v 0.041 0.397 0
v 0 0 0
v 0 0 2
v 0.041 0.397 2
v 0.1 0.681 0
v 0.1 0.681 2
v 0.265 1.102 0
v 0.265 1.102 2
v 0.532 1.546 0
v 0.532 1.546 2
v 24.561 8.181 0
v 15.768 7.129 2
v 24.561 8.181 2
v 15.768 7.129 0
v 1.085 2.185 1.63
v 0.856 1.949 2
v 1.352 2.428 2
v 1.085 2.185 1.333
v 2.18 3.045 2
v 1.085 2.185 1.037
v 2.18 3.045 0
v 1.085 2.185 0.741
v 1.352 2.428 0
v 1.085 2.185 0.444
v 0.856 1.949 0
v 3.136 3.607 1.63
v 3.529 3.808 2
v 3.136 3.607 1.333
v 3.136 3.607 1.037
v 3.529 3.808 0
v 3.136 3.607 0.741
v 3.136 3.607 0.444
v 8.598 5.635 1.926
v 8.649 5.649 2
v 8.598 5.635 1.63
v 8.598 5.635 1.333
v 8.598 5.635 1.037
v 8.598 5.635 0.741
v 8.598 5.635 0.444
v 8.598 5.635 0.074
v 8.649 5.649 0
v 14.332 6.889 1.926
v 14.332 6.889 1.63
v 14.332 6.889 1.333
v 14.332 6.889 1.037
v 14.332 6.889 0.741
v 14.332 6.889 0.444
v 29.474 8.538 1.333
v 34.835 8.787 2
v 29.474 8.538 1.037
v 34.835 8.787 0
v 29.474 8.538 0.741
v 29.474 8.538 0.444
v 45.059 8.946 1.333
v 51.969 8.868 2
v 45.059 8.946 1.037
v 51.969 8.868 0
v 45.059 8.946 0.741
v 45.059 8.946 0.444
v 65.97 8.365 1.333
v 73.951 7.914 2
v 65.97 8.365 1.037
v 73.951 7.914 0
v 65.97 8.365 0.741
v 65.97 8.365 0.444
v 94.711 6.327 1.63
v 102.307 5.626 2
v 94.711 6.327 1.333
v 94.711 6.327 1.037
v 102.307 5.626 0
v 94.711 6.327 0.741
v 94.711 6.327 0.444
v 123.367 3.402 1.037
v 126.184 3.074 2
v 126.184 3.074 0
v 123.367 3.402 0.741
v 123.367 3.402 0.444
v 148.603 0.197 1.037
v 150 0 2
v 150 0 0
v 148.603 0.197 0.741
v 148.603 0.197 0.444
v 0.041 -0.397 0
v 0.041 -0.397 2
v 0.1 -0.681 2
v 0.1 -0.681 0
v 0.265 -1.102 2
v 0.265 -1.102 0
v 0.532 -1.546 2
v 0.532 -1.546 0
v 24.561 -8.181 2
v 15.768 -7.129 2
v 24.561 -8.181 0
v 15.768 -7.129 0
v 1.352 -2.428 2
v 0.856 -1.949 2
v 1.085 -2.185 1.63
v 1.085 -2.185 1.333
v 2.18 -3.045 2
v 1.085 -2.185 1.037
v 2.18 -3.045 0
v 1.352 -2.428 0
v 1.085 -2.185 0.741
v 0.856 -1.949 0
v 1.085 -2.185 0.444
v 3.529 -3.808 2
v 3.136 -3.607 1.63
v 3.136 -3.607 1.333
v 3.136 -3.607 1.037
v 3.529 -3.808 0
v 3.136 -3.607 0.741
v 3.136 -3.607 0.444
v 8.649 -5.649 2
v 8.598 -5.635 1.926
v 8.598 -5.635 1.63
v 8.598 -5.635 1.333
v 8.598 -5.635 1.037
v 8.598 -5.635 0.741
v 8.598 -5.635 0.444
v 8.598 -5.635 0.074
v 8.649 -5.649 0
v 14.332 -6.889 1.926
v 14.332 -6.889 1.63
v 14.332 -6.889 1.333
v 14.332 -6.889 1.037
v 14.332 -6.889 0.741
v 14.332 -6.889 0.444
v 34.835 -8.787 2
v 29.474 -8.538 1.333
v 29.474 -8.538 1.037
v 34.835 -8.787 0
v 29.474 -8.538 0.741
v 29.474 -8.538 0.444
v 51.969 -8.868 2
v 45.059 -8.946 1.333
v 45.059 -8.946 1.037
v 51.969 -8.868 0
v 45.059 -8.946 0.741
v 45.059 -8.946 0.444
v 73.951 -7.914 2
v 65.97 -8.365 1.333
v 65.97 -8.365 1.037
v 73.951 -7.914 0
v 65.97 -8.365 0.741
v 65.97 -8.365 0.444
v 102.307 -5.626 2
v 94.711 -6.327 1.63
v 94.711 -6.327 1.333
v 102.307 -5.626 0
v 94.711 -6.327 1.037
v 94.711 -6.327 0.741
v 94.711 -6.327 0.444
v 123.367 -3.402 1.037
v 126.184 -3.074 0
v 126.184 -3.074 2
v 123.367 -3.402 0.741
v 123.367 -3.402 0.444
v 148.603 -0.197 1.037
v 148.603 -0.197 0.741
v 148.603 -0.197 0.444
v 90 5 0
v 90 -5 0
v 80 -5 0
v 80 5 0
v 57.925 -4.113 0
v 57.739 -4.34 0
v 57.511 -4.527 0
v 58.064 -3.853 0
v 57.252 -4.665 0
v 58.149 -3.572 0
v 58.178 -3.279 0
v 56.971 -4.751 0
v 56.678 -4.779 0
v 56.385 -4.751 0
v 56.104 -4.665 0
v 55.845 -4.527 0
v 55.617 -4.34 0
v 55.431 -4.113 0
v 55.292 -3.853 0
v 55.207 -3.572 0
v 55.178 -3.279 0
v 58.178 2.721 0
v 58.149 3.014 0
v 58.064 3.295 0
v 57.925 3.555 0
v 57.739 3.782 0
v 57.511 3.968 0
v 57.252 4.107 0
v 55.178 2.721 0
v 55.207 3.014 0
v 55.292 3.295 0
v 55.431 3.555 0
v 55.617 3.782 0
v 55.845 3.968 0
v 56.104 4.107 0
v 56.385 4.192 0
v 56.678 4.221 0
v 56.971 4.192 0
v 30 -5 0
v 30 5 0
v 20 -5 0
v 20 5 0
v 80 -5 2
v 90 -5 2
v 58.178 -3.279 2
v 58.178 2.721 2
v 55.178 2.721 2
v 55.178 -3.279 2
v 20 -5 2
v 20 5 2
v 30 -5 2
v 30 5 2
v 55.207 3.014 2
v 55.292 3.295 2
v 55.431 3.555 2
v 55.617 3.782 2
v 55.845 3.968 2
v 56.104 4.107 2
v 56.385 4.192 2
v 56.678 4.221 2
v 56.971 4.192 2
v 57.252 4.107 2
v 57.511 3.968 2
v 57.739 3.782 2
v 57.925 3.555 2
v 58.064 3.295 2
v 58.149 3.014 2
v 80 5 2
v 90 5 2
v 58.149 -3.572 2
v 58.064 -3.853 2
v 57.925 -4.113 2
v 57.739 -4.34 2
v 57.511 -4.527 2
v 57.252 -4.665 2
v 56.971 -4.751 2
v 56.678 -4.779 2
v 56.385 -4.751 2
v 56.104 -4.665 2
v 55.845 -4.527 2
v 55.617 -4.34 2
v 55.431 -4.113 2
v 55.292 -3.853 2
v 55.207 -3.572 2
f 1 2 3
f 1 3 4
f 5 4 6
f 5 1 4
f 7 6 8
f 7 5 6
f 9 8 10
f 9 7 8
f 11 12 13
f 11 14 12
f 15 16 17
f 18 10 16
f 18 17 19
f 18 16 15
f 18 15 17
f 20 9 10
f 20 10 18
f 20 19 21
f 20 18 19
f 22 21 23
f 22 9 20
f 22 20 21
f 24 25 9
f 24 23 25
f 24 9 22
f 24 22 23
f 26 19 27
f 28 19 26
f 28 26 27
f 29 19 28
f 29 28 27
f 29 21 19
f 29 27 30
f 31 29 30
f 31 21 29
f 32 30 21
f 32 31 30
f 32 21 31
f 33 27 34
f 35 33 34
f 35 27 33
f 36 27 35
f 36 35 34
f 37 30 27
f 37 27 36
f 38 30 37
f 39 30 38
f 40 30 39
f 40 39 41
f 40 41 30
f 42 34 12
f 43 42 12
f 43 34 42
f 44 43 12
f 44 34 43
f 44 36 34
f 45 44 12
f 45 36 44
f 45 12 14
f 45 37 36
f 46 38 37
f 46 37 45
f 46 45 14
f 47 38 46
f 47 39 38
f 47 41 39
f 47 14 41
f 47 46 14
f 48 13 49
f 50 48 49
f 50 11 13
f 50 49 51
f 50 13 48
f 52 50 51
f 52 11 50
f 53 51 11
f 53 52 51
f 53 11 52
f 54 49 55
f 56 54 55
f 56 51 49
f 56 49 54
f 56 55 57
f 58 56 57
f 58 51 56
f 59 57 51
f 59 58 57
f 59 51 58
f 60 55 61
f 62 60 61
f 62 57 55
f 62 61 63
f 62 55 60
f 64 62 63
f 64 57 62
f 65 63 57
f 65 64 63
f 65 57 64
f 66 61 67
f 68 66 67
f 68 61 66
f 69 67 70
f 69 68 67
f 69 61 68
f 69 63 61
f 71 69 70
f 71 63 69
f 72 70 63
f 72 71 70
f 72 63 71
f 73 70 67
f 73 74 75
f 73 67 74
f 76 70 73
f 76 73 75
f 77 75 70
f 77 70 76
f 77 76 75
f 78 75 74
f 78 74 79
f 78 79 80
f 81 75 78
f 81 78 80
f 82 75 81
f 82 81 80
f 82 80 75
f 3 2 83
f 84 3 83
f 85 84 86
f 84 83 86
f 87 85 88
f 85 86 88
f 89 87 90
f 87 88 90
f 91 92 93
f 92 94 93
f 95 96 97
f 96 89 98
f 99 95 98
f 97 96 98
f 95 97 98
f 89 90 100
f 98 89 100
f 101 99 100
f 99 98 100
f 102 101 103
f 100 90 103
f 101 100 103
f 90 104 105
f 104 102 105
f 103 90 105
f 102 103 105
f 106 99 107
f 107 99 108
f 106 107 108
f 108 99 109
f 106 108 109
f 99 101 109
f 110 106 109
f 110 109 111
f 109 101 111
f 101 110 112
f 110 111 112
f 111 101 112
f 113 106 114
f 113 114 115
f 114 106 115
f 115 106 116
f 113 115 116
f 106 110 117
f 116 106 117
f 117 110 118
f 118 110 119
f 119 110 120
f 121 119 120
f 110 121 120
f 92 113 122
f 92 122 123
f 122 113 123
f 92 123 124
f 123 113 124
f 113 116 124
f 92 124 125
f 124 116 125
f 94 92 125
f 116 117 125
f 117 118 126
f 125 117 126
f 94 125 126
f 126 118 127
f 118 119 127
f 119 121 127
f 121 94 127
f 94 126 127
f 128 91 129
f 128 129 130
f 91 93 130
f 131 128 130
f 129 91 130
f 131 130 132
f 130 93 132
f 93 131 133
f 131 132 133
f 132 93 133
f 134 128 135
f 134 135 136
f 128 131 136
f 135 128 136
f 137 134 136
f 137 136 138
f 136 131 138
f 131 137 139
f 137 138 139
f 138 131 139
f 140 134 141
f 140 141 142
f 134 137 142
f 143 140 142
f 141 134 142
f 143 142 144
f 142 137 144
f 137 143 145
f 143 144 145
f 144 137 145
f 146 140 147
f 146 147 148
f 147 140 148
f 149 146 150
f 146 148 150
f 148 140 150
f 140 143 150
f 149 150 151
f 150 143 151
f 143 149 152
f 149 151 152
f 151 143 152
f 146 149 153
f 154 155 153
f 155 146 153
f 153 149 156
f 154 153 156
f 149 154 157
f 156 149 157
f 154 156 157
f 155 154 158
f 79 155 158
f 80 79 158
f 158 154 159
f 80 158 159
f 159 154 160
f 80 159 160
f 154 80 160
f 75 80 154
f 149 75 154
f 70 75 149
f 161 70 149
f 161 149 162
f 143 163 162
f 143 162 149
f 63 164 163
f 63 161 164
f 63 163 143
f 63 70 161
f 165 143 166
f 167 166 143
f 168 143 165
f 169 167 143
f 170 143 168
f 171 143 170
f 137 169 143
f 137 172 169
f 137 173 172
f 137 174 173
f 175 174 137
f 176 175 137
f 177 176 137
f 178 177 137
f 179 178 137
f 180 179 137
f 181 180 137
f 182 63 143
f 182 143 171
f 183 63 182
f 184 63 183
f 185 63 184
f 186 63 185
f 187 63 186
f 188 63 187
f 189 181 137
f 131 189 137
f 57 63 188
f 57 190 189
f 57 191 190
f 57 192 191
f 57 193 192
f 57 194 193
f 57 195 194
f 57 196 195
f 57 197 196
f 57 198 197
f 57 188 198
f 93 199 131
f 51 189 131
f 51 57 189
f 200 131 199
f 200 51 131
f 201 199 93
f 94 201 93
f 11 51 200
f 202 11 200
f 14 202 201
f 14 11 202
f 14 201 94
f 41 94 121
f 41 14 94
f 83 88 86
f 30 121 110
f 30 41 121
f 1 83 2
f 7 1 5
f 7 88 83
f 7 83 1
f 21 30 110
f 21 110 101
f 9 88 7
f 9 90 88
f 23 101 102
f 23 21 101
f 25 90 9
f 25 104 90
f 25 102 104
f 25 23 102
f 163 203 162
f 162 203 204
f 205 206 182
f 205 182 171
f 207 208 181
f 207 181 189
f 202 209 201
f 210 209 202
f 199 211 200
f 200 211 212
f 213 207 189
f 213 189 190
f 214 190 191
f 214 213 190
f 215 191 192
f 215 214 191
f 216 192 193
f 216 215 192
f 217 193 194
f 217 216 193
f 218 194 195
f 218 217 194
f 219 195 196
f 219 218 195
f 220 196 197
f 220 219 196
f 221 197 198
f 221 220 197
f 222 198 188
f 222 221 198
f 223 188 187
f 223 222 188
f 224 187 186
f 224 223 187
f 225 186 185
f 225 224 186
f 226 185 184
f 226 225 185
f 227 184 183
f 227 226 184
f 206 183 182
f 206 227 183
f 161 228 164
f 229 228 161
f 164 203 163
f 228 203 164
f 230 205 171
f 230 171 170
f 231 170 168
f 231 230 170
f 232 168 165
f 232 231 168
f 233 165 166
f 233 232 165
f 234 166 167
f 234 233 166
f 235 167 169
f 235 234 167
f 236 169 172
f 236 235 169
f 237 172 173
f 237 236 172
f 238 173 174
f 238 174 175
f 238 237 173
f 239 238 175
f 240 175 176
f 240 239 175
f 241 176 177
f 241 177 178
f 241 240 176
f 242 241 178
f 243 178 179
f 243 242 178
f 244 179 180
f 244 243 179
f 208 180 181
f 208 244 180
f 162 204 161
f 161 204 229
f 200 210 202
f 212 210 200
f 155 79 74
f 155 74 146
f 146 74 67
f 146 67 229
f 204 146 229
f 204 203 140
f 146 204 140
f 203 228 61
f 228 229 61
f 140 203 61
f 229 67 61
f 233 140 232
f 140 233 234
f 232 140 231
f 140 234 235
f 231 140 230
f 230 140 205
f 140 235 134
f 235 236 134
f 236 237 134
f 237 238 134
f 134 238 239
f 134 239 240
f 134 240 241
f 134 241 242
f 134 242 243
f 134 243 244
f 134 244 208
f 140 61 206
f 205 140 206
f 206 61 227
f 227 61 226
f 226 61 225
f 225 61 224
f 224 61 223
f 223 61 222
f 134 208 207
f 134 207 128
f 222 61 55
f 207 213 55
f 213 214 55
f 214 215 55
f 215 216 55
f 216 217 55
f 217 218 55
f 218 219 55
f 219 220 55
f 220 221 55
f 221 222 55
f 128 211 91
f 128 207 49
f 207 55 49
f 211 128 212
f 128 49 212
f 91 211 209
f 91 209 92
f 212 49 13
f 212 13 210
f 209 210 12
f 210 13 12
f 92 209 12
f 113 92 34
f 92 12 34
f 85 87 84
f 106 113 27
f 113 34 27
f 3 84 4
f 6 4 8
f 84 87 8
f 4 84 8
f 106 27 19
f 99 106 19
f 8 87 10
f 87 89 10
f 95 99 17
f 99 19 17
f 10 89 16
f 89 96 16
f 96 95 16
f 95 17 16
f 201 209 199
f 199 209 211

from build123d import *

# Parameters (mm, degrees)
BOSS_EXTRUDE1_DEPTH = 2
SKETCH2_W           = 10
SKETCH2_H           = 10
CUT_EXTRUDE1_DEPTH  = 2
CUT_EXTRUDE2_DEPTH  = 2


with BuildPart() as part:
    # Sketch1 → Boss-Extrude1 (new body)
    with BuildSketch(Plane.XY):
        with BuildLine():
            add(Edge.make_bspline(
                [(0, 0), (0.017737679, 0.21563179), (0.054124727, 0.657978531), (0.343214492, 1.298862569), (0.793518335, 1.915453085), (1.418593739, 2.510411621), (2.210440726, 3.08584076), (3.169840337, 3.64229027), (4.294762462, 4.179129104), (5.583413569, 4.69513941), (7.033172592, 5.188783743), (8.640964446, 5.658406049), (11.080866503, 6.272892351), (14.502446863, 6.955454069), (19.033265173, 7.627780104), (24.084738243, 8.169485105), (29.61030038, 8.573350569), (36.653446176, 8.884204814), (45.268552866, 8.994485881), (55.449246929, 8.823980559), (67.247179838, 8.346573268), (80.384127491, 7.524875895), (94.475089666, 6.381384792), (108.784193237, 5.015612692), (123.127907022, 3.461297117), (136.57914049, 1.828195781), (145.420848795, 0.64480177), (149.505193273, 0.070051229), (149.970810304, 0.00413247), (150, 0)],
                knots=[0, 0, 0, 0, 0.004217542, 0.008651859, 0.013562306, 0.019137014, 0.025499556, 0.032726168, 0.040861643, 0.049929832, 0.059940125, 0.070891981, 0.082777029, 0.109285667, 0.139301078, 0.172602407, 0.208924358, 0.247964735, 0.310881146, 0.377906083, 0.447678538, 0.542484027, 0.636086648, 0.724985379, 0.824439816, 0.919092539, 0.990775422, 0.999421708, 1, 1, 1, 1], degree=3))
            add(Edge.make_bspline(
                [(0, 0), (0.017737679, -0.21563179), (0.054124727, -0.657978531), (0.343214492, -1.298862569), (0.793518335, -1.915453085), (1.418593739, -2.510411621), (2.210440726, -3.08584076), (3.169840337, -3.64229027), (4.294762462, -4.179129104), (5.583413569, -4.69513941), (7.033172592, -5.188783743), (8.640964446, -5.658406049), (11.080866503, -6.272892351), (14.502446863, -6.955454069), (19.033265173, -7.627780104), (24.084738243, -8.169485105), (29.61030038, -8.573350569), (36.653446176, -8.884204814), (45.268552866, -8.994485881), (55.449246929, -8.823980559), (67.247179838, -8.346573268), (80.384127491, -7.524875895), (94.475089666, -6.381384792), (108.784193237, -5.015612692), (123.127907022, -3.461297117), (136.57914049, -1.828195781), (145.420848795, -0.64480177), (149.505193273, -0.070051229), (149.970810304, -0.00413247), (150, 0)],
                knots=[0, 0, 0, 0, 0.004217542, 0.008651859, 0.013562306, 0.019137014, 0.025499556, 0.032726168, 0.040861643, 0.049929832, 0.059940125, 0.070891981, 0.082777029, 0.109285667, 0.139301078, 0.172602407, 0.208924358, 0.247964735, 0.310881146, 0.377906083, 0.447678538, 0.542484027, 0.636086648, 0.724985379, 0.824439816, 0.919092539, 0.990775422, 0.999421708, 1, 1, 1, 1], degree=3))
        make_face()
    extrude(amount=BOSS_EXTRUDE1_DEPTH)

    # Sketch2 → Cut-Extrude1 (cut)
    with BuildSketch(Plane.XY.offset(2)):
        with Locations((25, 0)):
            Rectangle(SKETCH2_W, SKETCH2_H)
        with Locations((85, 0)):
            Rectangle(SKETCH2_W, SKETCH2_H)
    extrude(amount=-CUT_EXTRUDE1_DEPTH, mode=Mode.SUBTRACT)

    # Sketch3 → Cut-Extrude2 (cut)
    with BuildSketch(Plane.XY.offset(2)):
        with BuildLine():
            Line((55.177854161, -3.279241302), (55.177854161, 2.721162631))
            ThreePointArc((55.177854161, 2.721162631), (56.677955144, 4.221263615), (58.178056128, 2.721162631))
            Line((58.178056128, 2.721162631), (58.178056128, -3.279241302))
            ThreePointArc((58.178056128, -3.279241302), (56.677955144, -4.779342285), (55.177854161, -3.279241302))
        make_face()
    extrude(amount=-CUT_EXTRUDE2_DEPTH, mode=Mode.SUBTRACT)


solid = part.part
